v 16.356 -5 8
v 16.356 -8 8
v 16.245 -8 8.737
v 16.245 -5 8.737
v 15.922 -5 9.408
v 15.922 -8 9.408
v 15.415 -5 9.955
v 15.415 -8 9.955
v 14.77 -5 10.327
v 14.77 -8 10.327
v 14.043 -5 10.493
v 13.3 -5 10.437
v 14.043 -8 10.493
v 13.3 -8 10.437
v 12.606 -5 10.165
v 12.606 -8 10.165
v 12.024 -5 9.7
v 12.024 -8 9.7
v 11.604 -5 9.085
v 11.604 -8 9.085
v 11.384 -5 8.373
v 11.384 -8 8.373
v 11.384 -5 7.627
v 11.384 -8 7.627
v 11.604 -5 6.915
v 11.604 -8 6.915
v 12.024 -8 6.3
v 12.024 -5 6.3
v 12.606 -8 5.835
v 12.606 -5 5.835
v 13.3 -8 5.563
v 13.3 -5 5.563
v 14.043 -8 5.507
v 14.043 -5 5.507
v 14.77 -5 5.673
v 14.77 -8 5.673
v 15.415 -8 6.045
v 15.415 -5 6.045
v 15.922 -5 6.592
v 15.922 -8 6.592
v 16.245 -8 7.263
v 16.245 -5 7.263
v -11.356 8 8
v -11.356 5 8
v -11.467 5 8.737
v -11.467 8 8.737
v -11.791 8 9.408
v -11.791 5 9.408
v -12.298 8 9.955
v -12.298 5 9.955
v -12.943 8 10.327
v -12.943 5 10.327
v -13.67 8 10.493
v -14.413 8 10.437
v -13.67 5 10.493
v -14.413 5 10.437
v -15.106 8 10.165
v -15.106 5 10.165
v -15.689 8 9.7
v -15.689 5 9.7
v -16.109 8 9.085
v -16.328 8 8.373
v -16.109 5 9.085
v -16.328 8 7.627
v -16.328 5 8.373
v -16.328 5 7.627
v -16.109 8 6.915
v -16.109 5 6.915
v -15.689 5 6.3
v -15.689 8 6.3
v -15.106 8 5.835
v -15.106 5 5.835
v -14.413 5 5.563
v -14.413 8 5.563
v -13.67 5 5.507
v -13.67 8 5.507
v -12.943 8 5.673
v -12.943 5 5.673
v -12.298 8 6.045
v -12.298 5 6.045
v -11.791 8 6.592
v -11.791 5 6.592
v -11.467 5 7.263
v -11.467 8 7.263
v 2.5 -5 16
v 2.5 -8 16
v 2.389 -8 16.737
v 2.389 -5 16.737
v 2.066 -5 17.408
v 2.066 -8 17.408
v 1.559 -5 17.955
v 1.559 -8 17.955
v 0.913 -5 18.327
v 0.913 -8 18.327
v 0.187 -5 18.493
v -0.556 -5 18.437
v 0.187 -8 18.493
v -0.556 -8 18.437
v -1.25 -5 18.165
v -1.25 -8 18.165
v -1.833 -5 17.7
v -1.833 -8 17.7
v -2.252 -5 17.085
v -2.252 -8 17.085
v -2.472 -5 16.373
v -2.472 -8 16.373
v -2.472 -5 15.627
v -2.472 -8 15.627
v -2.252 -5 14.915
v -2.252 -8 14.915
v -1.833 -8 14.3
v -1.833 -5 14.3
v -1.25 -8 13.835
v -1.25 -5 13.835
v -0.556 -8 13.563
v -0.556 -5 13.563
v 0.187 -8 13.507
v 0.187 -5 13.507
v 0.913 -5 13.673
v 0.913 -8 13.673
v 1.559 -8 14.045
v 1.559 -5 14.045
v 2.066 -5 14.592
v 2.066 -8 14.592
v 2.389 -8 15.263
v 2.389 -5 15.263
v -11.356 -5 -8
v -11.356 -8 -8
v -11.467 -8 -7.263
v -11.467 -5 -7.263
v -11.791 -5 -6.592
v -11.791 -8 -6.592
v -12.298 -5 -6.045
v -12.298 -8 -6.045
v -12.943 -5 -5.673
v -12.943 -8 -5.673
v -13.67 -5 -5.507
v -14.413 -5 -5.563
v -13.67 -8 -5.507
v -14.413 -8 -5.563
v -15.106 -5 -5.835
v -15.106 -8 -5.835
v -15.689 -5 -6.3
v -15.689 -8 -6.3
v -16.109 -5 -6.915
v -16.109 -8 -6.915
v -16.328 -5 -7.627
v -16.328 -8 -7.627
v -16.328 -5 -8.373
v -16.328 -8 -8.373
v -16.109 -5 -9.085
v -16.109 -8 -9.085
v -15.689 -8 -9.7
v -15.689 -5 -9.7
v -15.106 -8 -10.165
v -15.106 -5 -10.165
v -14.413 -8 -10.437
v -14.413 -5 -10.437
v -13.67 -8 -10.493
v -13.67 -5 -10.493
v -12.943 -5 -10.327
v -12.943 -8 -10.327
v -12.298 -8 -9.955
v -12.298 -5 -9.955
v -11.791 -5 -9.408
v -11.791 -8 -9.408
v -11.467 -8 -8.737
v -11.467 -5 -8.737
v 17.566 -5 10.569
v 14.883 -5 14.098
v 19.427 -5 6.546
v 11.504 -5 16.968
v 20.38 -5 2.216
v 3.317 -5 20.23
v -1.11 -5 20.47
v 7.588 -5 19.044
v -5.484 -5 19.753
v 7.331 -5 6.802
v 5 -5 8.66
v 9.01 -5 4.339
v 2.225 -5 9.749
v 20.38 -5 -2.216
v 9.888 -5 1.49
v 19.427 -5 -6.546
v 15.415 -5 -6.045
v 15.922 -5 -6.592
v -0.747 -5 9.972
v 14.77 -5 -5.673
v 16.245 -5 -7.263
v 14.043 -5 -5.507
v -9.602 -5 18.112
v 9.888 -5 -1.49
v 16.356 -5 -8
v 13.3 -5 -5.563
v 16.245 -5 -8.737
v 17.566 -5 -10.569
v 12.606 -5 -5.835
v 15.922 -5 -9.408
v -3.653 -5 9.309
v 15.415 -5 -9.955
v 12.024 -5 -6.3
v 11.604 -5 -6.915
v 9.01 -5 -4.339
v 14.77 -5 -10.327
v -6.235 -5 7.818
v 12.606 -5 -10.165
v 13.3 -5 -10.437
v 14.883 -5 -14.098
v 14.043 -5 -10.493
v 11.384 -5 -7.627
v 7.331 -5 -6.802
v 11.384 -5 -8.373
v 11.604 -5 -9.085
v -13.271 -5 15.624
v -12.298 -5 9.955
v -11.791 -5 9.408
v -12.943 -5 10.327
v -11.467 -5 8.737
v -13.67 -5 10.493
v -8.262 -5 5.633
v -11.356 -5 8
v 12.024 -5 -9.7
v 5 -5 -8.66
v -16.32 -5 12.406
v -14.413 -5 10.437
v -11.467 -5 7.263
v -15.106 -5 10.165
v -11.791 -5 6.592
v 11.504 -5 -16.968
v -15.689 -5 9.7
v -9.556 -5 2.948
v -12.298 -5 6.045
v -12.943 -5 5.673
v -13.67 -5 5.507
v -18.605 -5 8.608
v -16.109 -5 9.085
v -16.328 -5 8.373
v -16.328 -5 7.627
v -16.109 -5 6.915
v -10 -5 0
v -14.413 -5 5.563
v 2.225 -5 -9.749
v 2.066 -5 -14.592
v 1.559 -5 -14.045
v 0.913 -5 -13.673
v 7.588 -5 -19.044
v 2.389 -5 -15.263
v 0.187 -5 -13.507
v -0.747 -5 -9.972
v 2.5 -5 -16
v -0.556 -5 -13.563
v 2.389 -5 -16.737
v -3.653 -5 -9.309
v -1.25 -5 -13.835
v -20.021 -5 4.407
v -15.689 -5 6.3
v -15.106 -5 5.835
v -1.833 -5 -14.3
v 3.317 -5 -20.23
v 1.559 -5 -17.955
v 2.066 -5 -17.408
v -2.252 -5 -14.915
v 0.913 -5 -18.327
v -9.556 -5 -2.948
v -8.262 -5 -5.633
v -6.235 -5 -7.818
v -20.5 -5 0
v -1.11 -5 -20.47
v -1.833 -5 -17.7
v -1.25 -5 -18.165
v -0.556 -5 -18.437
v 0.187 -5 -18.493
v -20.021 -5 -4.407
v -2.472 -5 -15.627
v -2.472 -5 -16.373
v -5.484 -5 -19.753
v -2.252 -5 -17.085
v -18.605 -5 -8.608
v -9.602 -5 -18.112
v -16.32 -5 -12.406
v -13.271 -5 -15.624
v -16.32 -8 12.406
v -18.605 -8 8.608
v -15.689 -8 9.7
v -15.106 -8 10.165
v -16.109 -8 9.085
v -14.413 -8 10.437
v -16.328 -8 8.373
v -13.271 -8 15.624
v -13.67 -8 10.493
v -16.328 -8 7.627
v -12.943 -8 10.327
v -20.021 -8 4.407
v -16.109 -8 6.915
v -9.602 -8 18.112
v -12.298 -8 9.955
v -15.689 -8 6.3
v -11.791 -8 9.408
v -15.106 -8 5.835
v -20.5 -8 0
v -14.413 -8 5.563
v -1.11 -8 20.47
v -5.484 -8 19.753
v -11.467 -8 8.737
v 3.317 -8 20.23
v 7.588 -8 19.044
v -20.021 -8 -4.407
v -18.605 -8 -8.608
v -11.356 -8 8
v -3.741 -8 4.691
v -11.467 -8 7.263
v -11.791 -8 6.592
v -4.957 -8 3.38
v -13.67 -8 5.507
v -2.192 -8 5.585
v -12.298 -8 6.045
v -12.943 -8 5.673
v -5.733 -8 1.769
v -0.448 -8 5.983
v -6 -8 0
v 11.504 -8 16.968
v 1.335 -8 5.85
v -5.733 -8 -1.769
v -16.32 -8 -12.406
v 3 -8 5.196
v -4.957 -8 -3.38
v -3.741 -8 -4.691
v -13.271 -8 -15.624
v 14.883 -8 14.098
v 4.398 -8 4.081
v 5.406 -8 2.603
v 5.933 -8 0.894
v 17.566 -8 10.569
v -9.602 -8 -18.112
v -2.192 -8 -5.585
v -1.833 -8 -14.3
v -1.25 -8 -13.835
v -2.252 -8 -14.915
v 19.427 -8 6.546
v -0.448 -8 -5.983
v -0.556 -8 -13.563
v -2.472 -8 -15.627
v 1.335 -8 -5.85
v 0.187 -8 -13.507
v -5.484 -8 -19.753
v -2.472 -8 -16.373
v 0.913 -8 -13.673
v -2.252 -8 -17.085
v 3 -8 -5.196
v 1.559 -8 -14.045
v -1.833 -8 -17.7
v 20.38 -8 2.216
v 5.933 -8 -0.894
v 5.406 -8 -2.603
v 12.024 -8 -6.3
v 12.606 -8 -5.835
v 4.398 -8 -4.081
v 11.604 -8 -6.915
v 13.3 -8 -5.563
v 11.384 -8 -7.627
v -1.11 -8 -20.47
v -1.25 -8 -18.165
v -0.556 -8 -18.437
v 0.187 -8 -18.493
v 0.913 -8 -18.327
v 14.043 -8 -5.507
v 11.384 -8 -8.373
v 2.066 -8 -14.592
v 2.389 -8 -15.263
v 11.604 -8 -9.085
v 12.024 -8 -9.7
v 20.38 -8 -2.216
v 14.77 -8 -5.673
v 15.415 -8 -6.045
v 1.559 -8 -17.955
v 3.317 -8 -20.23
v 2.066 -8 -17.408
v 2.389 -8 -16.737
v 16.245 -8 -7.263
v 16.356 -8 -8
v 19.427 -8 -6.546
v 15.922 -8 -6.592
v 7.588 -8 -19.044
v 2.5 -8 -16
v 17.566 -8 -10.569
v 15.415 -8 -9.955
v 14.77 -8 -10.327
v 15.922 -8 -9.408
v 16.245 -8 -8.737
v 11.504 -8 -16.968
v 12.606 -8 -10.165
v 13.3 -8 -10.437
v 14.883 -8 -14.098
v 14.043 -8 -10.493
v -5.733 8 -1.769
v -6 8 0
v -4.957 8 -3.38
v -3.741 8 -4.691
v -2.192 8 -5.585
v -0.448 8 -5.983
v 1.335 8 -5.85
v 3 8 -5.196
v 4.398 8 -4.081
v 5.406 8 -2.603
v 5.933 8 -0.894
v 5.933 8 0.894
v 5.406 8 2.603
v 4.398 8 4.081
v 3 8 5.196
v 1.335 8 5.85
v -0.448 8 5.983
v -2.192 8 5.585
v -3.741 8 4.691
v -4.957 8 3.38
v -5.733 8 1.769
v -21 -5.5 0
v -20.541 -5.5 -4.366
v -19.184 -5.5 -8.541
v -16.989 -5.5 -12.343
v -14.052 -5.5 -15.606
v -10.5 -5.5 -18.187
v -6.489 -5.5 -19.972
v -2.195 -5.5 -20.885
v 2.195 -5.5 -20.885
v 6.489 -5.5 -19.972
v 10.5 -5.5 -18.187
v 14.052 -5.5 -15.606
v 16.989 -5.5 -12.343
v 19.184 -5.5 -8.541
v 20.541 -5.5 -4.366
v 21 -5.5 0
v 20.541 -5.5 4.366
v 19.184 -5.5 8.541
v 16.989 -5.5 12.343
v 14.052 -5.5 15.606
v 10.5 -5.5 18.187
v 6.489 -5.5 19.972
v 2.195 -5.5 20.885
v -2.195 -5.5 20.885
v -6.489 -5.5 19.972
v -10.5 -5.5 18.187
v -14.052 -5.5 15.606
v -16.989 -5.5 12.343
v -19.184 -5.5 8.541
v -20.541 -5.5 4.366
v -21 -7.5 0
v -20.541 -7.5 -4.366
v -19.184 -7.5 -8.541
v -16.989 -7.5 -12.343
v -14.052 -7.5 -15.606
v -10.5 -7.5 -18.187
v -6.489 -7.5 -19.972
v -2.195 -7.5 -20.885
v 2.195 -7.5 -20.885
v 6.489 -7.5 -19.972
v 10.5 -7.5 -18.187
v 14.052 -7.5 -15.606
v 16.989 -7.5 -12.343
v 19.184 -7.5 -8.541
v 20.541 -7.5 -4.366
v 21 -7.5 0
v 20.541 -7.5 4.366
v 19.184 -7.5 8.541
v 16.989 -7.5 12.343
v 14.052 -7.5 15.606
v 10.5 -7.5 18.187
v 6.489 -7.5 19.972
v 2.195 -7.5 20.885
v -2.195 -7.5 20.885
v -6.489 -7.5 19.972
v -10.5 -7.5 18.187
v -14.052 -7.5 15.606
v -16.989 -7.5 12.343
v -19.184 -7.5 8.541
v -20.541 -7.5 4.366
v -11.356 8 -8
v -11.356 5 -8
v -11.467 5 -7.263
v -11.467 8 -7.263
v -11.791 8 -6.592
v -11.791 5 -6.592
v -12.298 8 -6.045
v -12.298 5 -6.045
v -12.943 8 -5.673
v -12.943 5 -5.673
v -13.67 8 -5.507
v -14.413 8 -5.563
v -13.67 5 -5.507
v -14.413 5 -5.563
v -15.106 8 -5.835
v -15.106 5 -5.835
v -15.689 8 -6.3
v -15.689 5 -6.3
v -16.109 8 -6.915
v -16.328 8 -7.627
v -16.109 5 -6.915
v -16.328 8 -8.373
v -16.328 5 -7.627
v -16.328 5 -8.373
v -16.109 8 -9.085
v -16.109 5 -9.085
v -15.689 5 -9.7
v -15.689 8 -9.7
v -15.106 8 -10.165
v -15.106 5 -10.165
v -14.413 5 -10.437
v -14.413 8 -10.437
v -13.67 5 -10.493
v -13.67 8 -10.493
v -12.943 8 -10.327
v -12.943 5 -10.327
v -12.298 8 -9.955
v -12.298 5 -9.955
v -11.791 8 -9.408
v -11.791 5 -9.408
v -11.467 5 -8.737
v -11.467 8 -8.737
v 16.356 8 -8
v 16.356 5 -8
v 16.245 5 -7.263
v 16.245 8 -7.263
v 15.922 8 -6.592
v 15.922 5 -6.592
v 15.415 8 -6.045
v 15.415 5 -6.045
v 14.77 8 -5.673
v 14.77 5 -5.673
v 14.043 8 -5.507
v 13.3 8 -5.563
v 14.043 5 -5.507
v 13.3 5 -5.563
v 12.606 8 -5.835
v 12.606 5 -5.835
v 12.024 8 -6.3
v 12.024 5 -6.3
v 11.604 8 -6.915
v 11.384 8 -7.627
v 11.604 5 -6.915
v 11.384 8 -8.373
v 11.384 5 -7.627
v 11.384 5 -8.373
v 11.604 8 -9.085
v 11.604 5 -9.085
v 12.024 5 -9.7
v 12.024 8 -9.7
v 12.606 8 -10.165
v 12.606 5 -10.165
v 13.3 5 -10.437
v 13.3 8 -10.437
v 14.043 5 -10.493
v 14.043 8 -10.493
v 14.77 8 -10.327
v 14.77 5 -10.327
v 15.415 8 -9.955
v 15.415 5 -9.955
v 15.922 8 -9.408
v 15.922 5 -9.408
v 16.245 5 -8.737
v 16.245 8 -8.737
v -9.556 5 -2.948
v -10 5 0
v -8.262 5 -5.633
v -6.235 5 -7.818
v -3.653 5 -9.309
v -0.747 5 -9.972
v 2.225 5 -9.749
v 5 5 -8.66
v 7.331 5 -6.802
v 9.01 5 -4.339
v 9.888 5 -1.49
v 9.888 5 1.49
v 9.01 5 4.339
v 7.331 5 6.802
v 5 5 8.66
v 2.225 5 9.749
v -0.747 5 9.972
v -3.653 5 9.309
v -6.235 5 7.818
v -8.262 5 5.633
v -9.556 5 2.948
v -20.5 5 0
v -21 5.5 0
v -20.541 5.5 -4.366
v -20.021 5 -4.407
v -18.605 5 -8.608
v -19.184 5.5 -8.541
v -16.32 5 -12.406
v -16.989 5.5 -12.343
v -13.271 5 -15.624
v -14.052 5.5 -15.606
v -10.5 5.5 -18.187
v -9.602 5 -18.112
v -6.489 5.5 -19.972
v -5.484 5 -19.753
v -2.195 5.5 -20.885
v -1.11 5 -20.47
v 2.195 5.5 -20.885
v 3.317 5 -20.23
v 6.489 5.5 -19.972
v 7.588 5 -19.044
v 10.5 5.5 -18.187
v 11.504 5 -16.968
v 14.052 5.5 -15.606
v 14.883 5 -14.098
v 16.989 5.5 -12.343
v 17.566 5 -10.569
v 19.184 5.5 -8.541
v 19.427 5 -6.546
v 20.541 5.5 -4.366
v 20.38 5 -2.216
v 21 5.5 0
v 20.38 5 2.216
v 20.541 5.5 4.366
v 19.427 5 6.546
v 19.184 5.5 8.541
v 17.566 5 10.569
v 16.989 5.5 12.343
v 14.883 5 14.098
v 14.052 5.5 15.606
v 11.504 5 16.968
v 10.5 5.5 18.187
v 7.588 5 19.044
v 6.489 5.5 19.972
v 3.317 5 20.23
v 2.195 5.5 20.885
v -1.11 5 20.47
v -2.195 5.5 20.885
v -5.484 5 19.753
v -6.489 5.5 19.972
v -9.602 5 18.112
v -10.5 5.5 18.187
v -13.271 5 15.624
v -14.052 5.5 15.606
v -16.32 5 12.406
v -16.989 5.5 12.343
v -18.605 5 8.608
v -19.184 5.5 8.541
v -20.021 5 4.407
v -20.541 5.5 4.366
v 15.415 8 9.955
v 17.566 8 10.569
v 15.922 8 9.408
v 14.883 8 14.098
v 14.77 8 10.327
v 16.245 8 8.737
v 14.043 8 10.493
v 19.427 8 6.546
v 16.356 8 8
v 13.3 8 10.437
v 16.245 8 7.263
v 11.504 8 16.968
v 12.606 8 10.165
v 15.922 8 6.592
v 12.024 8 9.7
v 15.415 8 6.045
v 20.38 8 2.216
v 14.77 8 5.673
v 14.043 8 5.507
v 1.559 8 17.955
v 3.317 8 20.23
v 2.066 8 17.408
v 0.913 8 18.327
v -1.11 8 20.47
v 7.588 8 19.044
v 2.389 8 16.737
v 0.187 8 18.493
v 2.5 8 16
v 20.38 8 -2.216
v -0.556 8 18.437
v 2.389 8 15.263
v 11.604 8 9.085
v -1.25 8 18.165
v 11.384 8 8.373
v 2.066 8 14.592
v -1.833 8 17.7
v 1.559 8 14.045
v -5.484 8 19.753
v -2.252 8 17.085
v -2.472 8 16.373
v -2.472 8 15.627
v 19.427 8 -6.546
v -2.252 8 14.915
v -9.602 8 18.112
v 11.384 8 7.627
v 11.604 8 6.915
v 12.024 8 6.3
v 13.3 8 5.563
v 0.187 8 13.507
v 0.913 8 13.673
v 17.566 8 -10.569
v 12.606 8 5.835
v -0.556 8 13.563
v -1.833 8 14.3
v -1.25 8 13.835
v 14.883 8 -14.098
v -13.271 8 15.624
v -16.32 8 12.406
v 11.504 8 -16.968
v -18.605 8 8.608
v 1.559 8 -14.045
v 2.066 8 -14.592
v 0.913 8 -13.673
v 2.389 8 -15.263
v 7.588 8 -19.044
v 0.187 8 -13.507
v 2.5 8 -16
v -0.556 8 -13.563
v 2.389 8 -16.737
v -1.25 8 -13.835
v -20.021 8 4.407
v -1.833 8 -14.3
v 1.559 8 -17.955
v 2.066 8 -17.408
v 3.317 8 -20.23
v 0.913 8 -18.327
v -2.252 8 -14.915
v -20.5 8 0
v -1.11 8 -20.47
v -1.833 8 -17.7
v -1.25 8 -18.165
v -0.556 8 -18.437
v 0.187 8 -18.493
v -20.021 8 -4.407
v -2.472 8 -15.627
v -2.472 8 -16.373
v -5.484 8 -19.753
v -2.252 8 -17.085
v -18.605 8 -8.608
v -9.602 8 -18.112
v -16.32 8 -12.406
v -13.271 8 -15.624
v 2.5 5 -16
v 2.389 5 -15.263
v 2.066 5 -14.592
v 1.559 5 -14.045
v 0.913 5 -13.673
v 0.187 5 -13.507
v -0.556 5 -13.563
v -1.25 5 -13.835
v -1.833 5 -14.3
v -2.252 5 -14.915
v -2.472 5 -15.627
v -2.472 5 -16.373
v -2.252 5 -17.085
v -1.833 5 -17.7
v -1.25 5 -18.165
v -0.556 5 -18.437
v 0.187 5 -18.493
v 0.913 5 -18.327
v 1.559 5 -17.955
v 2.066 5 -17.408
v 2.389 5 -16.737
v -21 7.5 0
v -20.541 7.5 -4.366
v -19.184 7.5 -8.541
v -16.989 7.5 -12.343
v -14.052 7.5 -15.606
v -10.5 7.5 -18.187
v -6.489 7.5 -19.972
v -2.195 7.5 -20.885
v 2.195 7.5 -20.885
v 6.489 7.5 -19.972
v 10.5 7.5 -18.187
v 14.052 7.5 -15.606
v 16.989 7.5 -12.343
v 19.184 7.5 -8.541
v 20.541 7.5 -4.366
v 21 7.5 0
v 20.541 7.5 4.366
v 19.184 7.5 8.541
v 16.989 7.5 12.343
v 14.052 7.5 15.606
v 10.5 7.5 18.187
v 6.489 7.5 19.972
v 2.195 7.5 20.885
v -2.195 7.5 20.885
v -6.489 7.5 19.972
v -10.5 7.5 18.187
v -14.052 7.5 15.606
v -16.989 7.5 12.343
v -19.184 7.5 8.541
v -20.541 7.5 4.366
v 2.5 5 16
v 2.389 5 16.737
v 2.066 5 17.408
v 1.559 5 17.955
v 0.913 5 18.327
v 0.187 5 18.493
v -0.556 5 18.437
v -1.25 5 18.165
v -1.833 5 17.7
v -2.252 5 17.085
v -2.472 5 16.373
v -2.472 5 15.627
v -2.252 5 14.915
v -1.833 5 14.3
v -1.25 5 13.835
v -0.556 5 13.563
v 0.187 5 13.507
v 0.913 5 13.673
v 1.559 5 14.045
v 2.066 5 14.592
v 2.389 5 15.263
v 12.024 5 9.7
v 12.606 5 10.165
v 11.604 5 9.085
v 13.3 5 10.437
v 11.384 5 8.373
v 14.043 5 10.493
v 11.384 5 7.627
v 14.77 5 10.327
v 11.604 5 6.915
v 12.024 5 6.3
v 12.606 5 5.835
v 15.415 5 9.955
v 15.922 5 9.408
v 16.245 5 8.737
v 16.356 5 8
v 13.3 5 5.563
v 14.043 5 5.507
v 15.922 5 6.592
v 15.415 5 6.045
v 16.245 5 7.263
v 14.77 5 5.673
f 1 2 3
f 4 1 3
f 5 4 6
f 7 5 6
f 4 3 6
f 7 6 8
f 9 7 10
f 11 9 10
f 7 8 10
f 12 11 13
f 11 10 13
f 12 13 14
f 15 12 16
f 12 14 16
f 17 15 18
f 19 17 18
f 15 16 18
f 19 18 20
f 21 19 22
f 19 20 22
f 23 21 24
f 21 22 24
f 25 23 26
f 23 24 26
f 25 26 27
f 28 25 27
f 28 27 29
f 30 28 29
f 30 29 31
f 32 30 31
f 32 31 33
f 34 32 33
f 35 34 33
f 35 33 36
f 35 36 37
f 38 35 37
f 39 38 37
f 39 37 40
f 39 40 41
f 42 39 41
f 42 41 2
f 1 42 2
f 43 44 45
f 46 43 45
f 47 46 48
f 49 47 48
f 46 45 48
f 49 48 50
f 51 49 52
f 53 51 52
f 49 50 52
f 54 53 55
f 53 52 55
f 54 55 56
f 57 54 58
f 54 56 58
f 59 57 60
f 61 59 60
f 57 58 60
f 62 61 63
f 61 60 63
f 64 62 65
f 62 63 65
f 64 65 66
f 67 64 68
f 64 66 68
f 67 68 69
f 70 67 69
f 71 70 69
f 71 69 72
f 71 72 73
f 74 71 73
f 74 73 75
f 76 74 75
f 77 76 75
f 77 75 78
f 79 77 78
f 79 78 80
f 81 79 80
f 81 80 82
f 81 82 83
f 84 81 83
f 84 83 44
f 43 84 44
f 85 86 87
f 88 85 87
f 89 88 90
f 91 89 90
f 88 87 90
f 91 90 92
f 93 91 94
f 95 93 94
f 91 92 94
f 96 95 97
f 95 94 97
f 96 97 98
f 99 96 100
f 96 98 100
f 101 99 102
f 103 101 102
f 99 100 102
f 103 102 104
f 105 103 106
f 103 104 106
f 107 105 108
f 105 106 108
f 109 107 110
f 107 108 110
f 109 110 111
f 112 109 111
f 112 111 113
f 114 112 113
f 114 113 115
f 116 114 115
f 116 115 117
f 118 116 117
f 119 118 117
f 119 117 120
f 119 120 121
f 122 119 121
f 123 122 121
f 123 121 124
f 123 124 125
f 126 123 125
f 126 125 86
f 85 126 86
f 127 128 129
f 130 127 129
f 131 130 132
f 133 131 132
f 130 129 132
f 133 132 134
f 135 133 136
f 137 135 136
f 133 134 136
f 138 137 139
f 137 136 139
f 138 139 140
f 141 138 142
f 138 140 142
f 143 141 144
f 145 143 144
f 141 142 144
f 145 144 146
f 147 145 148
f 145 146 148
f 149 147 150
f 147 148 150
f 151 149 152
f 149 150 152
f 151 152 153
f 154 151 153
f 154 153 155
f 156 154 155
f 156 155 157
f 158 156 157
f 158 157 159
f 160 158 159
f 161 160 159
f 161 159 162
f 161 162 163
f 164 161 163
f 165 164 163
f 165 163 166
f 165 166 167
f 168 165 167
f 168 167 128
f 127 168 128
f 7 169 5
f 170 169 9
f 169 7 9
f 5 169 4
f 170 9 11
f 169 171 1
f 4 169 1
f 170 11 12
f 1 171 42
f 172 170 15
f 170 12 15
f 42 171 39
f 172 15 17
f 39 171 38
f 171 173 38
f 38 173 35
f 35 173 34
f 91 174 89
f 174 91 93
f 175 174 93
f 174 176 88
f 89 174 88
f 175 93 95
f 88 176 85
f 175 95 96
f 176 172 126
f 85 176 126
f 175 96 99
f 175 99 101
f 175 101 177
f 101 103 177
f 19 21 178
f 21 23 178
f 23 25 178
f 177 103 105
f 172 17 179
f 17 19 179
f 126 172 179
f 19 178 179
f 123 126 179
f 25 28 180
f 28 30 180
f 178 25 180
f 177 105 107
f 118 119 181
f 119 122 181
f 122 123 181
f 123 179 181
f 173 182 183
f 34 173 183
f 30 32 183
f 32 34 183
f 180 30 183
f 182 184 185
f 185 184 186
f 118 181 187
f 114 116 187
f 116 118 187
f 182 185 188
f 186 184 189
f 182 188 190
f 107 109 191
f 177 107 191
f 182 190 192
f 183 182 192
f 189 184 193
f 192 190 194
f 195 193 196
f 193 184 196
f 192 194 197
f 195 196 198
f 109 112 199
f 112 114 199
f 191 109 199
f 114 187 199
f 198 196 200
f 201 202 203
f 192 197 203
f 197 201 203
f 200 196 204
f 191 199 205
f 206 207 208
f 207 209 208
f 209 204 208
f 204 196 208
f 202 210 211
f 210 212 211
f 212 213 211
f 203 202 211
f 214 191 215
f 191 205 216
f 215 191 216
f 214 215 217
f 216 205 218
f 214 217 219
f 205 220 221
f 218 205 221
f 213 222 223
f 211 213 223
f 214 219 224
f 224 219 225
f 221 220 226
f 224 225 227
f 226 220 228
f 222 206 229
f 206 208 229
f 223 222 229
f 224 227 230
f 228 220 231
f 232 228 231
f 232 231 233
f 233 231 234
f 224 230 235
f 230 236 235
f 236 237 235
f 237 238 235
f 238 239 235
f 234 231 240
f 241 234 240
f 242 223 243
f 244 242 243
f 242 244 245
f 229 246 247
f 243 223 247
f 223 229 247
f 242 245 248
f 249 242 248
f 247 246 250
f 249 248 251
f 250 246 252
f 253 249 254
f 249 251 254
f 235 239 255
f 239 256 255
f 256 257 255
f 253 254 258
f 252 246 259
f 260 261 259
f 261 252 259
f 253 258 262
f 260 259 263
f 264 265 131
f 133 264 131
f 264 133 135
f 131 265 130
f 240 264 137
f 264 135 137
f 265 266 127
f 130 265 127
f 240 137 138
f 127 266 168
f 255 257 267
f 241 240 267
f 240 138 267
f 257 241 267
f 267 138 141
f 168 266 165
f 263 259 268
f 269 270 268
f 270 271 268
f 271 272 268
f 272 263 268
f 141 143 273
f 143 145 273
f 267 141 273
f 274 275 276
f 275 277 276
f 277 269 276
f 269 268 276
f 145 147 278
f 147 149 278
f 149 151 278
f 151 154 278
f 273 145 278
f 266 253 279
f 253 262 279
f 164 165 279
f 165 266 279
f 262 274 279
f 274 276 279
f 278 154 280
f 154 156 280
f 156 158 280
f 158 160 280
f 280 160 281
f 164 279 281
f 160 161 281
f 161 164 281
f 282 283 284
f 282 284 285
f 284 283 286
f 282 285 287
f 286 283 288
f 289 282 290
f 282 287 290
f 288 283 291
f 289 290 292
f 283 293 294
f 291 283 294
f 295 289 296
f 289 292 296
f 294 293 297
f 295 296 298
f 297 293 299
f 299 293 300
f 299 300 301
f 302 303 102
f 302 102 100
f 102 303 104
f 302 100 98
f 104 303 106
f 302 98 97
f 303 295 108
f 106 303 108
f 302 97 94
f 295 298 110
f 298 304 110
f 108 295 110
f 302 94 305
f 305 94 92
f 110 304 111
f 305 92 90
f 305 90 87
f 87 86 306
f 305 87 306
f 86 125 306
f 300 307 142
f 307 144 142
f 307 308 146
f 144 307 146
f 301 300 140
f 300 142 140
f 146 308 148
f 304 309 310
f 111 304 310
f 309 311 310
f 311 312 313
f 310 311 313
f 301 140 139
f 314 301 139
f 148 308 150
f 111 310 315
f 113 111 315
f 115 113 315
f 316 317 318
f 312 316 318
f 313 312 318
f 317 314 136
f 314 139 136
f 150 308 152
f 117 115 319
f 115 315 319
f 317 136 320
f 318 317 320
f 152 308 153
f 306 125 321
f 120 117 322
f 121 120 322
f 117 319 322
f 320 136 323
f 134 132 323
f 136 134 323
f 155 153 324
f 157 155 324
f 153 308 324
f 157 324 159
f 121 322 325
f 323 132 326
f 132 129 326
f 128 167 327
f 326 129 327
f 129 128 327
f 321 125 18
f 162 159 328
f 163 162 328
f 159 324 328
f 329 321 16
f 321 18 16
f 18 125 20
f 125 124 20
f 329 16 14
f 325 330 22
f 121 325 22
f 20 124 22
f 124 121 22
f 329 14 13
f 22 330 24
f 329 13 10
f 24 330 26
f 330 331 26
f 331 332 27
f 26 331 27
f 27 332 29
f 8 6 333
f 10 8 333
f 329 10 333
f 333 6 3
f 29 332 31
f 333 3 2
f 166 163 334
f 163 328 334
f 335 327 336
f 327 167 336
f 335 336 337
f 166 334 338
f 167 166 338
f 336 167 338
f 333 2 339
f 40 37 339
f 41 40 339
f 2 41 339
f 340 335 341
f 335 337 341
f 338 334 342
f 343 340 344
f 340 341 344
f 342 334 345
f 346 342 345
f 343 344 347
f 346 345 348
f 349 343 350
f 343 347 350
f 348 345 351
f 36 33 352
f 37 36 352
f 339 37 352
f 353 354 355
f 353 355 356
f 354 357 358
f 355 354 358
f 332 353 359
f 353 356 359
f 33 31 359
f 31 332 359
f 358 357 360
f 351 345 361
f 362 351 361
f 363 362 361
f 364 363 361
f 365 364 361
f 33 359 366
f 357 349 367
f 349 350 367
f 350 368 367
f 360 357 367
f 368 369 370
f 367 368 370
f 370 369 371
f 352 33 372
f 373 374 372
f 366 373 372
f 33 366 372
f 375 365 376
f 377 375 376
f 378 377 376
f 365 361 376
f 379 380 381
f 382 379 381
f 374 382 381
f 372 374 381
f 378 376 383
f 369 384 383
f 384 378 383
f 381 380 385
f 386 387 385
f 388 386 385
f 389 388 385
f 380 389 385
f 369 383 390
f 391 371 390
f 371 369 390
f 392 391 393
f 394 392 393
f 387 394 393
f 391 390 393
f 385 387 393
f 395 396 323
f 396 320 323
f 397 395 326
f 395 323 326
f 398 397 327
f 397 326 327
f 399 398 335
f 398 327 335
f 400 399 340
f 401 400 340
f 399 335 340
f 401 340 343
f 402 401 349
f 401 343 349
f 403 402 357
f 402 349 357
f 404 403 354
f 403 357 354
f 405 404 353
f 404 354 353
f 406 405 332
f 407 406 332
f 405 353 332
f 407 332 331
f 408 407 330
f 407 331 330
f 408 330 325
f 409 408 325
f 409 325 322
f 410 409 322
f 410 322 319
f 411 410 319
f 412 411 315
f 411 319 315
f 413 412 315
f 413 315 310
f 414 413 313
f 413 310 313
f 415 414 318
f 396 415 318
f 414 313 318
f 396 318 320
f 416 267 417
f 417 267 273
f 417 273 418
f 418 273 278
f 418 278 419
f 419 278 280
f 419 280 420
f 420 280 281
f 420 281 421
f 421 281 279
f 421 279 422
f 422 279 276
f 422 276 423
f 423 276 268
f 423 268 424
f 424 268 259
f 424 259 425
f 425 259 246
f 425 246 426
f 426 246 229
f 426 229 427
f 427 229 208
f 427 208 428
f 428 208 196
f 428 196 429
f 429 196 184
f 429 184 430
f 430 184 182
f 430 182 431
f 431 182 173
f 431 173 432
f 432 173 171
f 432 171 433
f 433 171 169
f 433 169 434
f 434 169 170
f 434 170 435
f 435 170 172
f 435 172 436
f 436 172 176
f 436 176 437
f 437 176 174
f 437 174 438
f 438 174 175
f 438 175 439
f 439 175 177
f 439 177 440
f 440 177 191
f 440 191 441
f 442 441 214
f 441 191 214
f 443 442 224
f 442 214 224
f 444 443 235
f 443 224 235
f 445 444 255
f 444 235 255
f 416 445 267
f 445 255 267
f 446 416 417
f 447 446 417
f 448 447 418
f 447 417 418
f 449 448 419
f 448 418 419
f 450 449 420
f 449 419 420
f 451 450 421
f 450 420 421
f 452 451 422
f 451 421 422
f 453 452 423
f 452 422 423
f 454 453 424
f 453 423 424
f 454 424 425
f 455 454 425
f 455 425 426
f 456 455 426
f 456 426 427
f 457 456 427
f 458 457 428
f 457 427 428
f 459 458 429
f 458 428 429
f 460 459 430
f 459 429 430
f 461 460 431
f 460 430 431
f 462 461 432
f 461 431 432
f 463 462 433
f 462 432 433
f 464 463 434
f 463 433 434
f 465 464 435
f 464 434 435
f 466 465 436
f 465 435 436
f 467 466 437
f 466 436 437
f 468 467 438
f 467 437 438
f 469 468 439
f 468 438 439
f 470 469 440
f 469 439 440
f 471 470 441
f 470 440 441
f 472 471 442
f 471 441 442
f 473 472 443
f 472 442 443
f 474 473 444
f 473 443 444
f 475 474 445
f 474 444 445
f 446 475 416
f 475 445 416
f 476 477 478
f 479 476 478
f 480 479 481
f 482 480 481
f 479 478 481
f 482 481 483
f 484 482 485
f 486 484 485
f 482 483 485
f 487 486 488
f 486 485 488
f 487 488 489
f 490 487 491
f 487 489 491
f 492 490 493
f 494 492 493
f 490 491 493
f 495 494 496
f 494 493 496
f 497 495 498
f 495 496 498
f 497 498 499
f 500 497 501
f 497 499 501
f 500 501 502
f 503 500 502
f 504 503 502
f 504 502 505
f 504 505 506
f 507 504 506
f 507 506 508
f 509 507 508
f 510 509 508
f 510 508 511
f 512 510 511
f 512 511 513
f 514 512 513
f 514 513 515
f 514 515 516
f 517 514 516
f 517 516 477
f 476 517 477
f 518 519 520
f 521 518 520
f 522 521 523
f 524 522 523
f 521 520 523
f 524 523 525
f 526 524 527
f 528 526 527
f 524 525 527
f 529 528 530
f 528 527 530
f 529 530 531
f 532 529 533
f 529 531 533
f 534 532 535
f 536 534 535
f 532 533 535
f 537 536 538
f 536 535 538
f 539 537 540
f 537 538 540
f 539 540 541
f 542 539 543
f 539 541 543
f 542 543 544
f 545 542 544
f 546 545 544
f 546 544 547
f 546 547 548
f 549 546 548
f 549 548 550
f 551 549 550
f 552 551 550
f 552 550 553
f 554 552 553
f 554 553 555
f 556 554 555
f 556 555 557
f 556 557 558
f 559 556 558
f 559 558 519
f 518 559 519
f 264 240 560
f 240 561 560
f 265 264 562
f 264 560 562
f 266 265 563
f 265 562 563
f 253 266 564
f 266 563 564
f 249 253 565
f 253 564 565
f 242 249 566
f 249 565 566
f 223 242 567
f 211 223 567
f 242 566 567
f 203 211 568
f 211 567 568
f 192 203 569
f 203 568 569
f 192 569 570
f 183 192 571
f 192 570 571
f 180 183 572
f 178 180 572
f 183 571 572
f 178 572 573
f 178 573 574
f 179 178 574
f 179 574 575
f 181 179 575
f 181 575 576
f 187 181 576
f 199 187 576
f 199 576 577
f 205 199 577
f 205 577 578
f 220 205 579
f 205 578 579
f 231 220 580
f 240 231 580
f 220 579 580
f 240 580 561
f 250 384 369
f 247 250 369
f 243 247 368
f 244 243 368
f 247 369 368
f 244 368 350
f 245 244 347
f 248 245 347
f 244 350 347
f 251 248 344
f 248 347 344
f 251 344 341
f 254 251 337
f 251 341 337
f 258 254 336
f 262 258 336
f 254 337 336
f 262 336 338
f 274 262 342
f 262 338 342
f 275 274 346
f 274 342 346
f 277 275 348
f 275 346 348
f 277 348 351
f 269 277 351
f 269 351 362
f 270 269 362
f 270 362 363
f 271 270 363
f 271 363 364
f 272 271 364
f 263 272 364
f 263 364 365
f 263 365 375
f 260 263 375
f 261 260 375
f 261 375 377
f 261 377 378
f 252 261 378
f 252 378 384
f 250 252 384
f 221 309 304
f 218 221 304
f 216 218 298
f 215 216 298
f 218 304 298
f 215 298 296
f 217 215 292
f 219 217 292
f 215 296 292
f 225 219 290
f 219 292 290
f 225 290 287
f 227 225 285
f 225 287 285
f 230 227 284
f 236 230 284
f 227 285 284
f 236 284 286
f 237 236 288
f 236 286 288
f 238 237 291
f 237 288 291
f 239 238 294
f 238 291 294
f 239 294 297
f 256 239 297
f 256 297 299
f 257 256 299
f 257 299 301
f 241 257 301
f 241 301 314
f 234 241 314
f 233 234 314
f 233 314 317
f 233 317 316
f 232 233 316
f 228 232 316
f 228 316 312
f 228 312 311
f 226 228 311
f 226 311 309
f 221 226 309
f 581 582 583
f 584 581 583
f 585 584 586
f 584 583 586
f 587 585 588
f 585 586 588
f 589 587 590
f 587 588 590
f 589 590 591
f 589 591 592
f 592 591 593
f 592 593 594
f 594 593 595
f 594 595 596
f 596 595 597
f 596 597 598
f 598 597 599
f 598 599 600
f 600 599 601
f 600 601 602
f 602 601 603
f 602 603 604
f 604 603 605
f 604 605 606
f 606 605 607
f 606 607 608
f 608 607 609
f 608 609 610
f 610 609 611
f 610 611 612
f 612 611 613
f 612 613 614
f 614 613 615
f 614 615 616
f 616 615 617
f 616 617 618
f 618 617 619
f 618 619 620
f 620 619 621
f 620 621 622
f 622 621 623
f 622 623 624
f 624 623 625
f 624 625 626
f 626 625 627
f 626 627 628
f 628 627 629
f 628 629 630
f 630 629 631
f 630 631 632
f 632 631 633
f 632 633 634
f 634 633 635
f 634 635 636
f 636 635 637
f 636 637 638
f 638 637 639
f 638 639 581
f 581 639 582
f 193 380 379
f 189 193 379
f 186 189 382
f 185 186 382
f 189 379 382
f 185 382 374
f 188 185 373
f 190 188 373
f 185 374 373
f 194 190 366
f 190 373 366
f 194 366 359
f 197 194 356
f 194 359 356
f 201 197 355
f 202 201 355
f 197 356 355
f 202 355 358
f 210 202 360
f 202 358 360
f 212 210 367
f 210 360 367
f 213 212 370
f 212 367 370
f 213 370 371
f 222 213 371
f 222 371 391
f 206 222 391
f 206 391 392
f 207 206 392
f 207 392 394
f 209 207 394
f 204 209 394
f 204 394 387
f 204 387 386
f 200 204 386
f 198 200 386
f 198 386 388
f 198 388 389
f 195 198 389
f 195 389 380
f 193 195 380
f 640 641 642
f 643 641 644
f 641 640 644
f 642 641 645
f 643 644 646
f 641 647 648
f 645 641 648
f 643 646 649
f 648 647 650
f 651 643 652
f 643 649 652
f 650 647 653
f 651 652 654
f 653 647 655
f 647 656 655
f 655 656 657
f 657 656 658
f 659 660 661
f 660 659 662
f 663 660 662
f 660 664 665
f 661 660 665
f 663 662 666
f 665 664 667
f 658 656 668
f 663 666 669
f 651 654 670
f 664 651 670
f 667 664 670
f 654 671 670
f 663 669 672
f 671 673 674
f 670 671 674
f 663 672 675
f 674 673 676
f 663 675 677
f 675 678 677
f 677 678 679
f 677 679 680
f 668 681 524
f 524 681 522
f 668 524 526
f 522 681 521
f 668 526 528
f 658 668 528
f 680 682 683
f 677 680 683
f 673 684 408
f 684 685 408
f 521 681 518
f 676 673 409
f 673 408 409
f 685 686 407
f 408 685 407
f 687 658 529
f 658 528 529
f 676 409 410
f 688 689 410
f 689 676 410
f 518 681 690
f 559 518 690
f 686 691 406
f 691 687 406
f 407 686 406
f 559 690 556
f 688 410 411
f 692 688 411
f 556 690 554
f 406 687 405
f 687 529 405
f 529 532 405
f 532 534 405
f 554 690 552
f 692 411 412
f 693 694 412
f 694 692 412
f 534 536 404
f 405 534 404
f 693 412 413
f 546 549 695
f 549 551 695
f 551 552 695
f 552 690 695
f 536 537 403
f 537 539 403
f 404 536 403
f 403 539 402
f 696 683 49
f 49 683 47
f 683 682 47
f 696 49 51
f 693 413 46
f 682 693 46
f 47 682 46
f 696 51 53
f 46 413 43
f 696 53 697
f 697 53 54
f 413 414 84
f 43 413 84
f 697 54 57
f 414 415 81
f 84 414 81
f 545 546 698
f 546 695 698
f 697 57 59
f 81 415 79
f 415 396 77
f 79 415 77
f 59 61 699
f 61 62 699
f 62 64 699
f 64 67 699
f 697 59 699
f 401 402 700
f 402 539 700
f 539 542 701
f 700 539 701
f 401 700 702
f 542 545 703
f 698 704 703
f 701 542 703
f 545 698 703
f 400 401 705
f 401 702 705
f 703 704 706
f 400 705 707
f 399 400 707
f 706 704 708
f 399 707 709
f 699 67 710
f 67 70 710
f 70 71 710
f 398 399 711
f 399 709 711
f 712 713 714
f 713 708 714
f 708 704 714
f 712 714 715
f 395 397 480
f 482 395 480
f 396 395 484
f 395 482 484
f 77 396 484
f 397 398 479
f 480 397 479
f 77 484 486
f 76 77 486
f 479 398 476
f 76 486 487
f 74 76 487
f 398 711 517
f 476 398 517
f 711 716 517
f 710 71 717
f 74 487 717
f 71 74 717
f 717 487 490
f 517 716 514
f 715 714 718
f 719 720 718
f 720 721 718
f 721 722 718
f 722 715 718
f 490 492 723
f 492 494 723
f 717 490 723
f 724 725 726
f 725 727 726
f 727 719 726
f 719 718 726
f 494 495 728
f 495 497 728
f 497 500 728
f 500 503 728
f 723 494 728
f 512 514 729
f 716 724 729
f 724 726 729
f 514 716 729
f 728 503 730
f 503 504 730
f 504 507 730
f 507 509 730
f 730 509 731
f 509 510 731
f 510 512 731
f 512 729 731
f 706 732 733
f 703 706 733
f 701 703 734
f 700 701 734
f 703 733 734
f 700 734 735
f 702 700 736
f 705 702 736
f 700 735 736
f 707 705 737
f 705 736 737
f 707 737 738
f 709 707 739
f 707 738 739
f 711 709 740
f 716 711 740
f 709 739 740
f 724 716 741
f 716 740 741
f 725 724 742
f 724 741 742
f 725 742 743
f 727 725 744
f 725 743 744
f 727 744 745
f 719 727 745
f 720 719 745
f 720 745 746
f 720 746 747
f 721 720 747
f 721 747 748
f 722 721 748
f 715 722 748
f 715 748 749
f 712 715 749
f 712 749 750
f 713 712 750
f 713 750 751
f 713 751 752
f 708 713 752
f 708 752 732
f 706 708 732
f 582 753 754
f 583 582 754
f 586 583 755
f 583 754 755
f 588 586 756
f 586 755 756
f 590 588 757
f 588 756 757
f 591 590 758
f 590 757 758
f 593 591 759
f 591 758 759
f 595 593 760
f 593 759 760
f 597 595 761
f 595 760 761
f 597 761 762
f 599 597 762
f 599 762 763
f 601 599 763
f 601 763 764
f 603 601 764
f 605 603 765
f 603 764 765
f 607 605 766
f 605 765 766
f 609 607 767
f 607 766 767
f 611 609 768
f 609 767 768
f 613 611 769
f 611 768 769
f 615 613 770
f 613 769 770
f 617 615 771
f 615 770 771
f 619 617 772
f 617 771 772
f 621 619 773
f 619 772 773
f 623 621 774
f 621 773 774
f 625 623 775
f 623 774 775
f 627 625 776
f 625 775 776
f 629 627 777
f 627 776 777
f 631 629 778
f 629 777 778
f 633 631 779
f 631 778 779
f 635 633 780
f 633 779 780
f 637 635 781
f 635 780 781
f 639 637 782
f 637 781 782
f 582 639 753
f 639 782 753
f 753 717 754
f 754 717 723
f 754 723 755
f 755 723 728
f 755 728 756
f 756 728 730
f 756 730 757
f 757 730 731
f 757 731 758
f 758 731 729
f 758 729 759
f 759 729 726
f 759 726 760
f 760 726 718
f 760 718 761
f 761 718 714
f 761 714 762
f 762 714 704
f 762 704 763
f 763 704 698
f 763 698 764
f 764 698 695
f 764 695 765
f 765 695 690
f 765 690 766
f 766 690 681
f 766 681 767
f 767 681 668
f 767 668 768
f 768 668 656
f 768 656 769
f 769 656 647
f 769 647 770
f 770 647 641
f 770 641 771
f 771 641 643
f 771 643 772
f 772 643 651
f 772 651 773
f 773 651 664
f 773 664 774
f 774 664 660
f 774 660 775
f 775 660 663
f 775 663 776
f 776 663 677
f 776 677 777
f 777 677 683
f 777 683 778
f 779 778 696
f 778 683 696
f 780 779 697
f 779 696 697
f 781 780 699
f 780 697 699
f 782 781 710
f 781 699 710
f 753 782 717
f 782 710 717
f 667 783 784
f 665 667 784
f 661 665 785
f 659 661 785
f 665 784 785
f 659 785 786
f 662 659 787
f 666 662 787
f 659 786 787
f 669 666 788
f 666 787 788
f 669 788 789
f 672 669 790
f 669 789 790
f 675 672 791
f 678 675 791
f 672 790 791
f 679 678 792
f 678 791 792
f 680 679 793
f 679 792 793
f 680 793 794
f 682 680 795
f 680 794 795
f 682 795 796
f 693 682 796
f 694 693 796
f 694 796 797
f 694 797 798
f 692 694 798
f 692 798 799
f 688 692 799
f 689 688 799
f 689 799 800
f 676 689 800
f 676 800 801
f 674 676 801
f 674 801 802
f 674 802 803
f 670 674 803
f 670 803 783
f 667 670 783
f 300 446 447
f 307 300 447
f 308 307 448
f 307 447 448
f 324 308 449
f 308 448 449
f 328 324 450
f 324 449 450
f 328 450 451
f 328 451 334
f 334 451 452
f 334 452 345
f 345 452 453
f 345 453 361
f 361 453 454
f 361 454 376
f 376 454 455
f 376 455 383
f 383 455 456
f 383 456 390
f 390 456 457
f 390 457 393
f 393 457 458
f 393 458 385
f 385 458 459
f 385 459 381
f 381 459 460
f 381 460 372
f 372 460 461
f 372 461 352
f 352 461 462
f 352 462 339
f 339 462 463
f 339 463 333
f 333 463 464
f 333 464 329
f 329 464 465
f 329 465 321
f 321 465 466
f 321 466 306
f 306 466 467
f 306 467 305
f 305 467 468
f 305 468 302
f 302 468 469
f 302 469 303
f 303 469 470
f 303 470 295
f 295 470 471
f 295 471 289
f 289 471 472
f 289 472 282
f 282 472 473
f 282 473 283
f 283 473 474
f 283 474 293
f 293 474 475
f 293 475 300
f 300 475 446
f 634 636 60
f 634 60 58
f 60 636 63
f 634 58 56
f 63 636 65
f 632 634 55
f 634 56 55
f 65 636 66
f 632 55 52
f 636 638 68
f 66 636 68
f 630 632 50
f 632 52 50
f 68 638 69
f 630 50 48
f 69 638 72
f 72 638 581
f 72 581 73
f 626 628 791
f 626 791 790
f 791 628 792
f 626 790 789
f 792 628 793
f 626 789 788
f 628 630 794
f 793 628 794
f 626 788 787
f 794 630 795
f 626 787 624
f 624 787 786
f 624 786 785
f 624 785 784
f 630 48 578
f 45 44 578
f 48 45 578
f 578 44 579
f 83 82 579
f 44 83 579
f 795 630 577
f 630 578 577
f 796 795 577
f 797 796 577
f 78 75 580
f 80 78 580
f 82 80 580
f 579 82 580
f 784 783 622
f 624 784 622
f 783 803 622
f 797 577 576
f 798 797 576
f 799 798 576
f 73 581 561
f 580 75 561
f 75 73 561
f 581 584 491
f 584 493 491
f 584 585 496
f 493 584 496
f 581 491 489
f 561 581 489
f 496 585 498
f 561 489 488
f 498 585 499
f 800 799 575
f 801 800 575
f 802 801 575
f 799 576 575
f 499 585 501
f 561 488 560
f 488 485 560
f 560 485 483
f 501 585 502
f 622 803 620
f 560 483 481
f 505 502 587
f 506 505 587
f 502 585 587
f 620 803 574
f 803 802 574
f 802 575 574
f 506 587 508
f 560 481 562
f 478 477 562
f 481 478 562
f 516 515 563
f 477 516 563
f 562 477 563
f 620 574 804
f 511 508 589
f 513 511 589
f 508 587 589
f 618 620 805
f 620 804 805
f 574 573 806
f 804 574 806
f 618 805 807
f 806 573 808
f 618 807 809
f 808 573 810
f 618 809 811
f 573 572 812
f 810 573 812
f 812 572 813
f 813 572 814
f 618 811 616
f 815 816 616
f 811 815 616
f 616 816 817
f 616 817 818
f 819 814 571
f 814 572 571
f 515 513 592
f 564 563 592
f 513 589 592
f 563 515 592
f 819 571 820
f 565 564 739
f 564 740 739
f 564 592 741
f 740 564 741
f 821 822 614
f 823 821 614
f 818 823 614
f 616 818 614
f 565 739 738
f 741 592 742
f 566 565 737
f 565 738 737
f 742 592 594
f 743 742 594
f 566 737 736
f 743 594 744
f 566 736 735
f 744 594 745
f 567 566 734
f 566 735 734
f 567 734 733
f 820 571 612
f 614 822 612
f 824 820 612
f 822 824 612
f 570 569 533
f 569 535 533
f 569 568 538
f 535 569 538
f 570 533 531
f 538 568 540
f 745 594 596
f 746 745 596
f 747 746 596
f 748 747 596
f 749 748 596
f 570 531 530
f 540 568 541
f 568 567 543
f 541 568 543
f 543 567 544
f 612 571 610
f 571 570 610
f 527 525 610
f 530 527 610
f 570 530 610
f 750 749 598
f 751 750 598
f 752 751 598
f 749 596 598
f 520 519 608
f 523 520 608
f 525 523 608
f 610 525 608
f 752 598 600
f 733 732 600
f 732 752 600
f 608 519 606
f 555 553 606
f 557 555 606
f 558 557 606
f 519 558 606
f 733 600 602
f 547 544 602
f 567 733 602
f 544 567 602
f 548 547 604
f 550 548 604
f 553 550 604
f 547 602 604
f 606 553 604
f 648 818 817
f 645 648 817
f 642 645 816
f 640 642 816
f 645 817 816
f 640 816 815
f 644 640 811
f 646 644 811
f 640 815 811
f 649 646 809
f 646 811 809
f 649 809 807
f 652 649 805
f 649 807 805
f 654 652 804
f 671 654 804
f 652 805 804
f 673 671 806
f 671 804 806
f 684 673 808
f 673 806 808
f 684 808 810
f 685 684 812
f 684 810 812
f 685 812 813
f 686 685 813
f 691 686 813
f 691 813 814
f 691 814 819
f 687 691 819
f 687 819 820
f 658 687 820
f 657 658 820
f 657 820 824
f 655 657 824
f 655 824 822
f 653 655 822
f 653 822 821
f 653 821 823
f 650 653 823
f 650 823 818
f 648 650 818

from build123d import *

# Parameters (mm, degrees)
CHAMFER1_SIZE           = 0.5
SKETCH2_R               = 2.5
CUT_EXTRUDE1_DEPTH      = 1
CUT_EXTRUDE1_DEPTH_BACK = 17


with BuildPart() as part:
    # Sketch1 → Revolve1 (revolve)
    with BuildSketch(Plane.XY):
        Polygon((-6, 8), (-6, -8), (-21, -8), (-21, -5), (-10, -5), (-10, 5), (-21, 5), (-21, 8), align=None)
    revolve(axis=Axis((0, 39.685139112, 0), (0, -1, 0)))

    # Chamfer1
    chamfer1_edges = [part.edges().sort_by_distance(p)[0] for p in [
        (21, -8, 0),
        (21, 8, 0),
        (21, 5, 0),
        (21, -5, 0),
    ]]
    chamfer(chamfer1_edges, length=CHAMFER1_SIZE)

    # Sketch2 → Cut-Extrude1 (cut, two sides)
    with BuildSketch(Plane.XZ.offset(8)) as cut_extrude1_sk:
        with Locations((0, 16)):
            Circle(SKETCH2_R)
        with Locations((13.856406461, 8)):
            Circle(SKETCH2_R)
        with Locations((13.856406461, -8)):
            Circle(SKETCH2_R)
        with Locations((0, -16)):
            Circle(SKETCH2_R)
        with Locations((-13.856406461, -8)):
            Circle(SKETCH2_R)
        with Locations((-13.856406461, 8)):
            Circle(SKETCH2_R)
    extrude(amount=CUT_EXTRUDE1_DEPTH, mode=Mode.SUBTRACT)
    extrude(cut_extrude1_sk.sketch, amount=-CUT_EXTRUDE1_DEPTH_BACK, mode=Mode.SUBTRACT)


solid = part.part
